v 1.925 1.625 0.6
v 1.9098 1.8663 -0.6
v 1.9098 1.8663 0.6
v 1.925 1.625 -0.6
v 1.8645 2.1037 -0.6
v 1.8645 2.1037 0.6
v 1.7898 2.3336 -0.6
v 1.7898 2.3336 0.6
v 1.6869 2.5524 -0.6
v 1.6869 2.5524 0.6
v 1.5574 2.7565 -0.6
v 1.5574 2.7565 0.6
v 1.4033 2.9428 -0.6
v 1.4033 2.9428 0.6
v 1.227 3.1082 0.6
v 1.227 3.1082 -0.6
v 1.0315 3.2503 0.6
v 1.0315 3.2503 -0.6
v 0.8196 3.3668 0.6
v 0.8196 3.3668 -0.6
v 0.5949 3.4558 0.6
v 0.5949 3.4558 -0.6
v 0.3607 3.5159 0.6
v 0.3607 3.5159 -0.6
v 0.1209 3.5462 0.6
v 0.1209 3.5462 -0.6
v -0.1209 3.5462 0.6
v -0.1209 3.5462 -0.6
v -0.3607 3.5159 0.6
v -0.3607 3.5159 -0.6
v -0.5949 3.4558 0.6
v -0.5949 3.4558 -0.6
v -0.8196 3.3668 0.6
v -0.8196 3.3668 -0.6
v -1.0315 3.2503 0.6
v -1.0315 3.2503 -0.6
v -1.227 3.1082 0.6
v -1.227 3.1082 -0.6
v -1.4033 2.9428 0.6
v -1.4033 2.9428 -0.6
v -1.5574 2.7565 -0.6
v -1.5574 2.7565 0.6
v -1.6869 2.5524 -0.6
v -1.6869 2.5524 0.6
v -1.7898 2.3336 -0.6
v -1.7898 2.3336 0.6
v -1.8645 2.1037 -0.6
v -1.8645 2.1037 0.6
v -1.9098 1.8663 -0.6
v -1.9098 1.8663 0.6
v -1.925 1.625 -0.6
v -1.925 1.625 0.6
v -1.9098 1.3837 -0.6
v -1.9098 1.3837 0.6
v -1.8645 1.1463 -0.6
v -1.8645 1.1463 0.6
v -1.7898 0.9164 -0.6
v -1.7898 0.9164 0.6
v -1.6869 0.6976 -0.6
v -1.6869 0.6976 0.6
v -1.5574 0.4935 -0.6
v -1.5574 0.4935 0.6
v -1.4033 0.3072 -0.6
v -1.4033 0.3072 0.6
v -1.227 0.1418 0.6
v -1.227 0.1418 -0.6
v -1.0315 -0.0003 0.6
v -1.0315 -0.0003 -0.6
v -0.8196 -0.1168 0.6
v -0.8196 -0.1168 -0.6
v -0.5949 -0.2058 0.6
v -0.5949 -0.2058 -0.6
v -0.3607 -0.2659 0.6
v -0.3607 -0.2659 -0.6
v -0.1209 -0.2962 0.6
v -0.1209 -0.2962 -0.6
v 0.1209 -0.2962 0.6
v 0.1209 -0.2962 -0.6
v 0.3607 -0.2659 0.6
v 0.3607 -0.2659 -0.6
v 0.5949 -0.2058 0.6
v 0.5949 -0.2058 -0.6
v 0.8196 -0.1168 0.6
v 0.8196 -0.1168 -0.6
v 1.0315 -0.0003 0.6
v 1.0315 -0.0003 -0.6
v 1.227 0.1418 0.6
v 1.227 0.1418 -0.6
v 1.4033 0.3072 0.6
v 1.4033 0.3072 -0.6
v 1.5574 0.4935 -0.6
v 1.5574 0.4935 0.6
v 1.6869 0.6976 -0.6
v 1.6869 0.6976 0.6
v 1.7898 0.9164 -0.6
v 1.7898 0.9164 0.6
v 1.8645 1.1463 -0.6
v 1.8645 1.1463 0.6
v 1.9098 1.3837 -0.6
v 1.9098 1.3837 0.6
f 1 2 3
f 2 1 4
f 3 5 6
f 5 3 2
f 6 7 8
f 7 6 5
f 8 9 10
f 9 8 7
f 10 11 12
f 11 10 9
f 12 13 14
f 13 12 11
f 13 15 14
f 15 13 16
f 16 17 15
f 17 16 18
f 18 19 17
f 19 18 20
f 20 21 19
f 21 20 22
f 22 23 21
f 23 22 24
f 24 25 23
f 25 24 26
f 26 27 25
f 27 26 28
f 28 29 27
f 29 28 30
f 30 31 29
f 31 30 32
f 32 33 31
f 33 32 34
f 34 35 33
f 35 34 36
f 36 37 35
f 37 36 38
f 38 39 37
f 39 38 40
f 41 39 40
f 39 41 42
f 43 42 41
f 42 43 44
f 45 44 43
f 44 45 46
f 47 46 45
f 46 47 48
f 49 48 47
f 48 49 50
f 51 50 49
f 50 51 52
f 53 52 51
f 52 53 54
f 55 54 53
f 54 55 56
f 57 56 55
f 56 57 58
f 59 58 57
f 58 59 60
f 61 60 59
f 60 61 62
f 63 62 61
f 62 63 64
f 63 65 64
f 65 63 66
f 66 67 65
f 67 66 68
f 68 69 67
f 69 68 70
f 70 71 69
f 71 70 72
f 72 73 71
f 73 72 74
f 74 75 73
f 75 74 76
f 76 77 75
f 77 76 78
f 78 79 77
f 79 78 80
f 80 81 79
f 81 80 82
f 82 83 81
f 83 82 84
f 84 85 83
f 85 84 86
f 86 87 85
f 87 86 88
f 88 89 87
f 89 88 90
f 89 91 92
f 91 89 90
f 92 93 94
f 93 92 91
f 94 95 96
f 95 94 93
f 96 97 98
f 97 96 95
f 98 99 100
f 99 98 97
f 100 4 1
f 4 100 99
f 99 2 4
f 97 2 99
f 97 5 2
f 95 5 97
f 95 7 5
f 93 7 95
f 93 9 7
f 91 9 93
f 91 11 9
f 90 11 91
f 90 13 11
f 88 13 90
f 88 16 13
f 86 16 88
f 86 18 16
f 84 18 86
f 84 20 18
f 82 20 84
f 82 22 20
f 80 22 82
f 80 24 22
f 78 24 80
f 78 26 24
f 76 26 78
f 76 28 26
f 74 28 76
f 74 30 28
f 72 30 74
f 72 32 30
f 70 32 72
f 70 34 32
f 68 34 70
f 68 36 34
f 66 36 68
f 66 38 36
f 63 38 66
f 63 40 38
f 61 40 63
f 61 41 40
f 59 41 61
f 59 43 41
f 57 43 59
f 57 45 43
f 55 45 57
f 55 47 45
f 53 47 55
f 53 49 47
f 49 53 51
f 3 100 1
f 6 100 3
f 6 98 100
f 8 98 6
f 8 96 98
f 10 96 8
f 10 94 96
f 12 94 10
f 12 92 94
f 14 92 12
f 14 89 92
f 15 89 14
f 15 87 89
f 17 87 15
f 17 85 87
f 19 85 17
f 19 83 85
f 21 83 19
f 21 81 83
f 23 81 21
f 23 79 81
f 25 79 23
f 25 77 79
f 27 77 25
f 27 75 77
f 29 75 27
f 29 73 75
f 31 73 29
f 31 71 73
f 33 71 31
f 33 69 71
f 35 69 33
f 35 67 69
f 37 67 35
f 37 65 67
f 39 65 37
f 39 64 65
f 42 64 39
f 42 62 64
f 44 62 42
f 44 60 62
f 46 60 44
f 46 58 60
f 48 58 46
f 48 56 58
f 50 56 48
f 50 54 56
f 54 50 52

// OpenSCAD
$fn = 50;

module Klinke(hole_offset, wall) {
  radius = (3.25 / 2);
  r = radius + hole_offset;

  translate([ 0, radius, 0 ]) cylinder(h = wall, r = r, center = true);
}

Klinke(hole_offset = 0.3, wall = 1.2);
